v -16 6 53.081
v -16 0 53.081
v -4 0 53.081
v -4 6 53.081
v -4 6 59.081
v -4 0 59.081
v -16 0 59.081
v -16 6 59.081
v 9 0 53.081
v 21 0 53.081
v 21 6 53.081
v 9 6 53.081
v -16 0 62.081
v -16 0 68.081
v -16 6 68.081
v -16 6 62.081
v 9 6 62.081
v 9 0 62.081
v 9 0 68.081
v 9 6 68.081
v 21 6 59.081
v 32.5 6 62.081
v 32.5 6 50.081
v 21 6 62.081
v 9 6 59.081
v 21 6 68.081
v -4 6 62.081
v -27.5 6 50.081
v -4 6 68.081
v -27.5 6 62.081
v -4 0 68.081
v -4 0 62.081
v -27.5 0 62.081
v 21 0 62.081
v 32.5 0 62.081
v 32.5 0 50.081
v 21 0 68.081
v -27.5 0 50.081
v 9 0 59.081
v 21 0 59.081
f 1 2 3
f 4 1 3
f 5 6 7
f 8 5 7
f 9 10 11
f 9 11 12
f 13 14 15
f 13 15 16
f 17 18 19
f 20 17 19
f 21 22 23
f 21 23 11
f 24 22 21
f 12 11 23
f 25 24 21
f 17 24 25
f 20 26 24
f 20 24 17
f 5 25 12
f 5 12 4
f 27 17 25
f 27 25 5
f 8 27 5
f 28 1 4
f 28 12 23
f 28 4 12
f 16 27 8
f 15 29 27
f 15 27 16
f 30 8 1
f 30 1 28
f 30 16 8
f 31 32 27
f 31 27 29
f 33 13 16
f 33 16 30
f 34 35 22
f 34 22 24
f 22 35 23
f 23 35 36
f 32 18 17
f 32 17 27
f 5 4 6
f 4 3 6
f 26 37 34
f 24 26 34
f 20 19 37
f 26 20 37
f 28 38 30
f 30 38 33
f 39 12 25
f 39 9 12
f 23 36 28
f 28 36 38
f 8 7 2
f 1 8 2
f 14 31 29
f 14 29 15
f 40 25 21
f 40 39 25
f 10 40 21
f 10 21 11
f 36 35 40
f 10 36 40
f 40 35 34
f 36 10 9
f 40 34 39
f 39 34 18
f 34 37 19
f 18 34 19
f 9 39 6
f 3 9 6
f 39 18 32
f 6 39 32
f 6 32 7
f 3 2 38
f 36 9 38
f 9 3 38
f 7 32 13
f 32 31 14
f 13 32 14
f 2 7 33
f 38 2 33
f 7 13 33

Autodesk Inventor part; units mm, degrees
ref_plane "YZ Plane" through (0, 0, 0) normal (1, 0, 0) x (0, 1, 0)
ref_plane "XZ Plane" through (0, 0, 0) normal (0, 1, 0) x (-1, 0, 0)
ref_plane "XY Plane" through (0, 0, 0) normal (0, 0, 1) x (1, 0, 0)
sketch "Sketch1" plane through (0, 0, 0) normal (0, 1, 0) x (-1, 0, 0)
  line L0 (27.5, 50.0814) -> (27.5, 62.0814)
  line L1 (-32.5, 62.0814) -> (-32.5, 50.0814)
  line L2 (-32.5, 50.0814) -> (-2.5, 50.0814)
  line L3 (-2.5, 50.0814) -> (-2.5, 62.0814) construction
  line L4 (-32.5, 56.0814) -> (-2.5, 56.0814) construction
  line L5 (-32.5, 62.0814) -> (27.5, 62.0814)
  line L6 (-21, 62.0814) -> (-9, 62.0814)
  line L7 (-9, 62.0814) -> (-9, 68.0814)
  line L8 (-9, 68.0814) -> (-21, 68.0814)
  line L9 (-21, 68.0814) -> (-21, 62.0814)
  line L10 (16, 62.0814) -> (4, 62.0814)
  line L11 (4, 62.0814) -> (4, 68.0814)
  line L12 (4, 68.0814) -> (16, 68.0814)
  line L13 (16, 68.0814) -> (16, 62.0814)
  line L14 (-2.5, 56.0814) -> (27.5, 56.0814) construction
  line L15 (-2.5, 50.0814) -> (27.5, 50.0814)
  line L16 (-9, 59.0814) -> (-21, 59.0814)
  line L17 (-21, 59.0814) -> (-21, 53.0814)
  line L18 (-21, 53.0814) -> (-9, 53.0814)
  line L19 (-9, 53.0814) -> (-9, 59.0814)
  line L20 (-9, 59.0814) -> (-21, 53.0814) construction
  line L21 (-21, 59.0814) -> (-9, 53.0814) construction
  line L22 (4, 59.0814) -> (16, 59.0814)
  line L23 (16, 59.0814) -> (16, 53.0814)
  line L24 (16, 53.0814) -> (4, 53.0814)
  line L25 (4, 53.0814) -> (4, 59.0814)
  line L26 (4, 59.0814) -> (16, 53.0814) construction
  line L27 (16, 59.0814) -> (4, 53.0814) construction
  point P0 (-15, 56.0814)
  point P1 (10, 56.0814)
  dimension "d0" = 60
  dimension "d1" = 12
  dimension "d18" = 12
  dimension "d19" = 6
  dimension "d20" = 18.5
  dimension "d21" = 12
  dimension "d22" = 6
  dimension "d23" = 3
extrude "Extrusion1" add sketch "Sketch1" along normal blind 6
sketch "Sketch3" plane through (0, 0, 0) normal (0, 1, 0) x (-1, 0, 0)
  line L0 (4, 62.0814) -> (-9, 62.0814) construction
  line L1 (-2.5, 62.0814) -> (-2.5, 50.0814) construction
  line L2 (-32.5, 50.0814) -> (27.5, 50.0814) construction
  line L3 (8.5, 50.0814) -> (2.5, 50.0814)
  line L4 (2.5, 50.0814) -> (2.5, 44.0814)
  line L5 (2.5, 44.0814) -> (8.5, 44.0814)
  line L6 (8.5, 44.0814) -> (8.5, 50.0814)
  line L7 (8.5, -0.9186) -> (2.5, -0.9186)
  line L8 (2.5, -0.9186) -> (2.5, -6.9186)
  line L9 (2.5, -6.9186) -> (8.5, -6.9186)
  line L10 (8.5, -6.9186) -> (8.5, -0.9186)
  line L11 (8.5, 35.0814) -> (-9.5, 35.0814)
  line L12 (-9.5, 35.0814) -> (-9.5, 23.0814)
  line L13 (-9.5, 13.0814) -> (8.5, 13.0814)
  line L14 (8.5, 13.0814) -> (8.5, 23.0814)
  line L15 (-13, 35.0814) -> (12, 35.0814)
  line L16 (8.5, 23.0814) -> (-9.5, 23.0814)
  line L17 (1.5, 35.0814) -> (-5.5, 35.0814)
  line L18 (-5.5, 35.0814) -> (-5.5, 40.0814)
  line L19 (-5.5, 40.0814) -> (1.5, 40.0814)
  line L20 (1.5, 40.0814) -> (1.5, 35.0814)
  line L21 (-9.5, 23.0814) -> (-9.5, 13.0814)
  line L22 (8.5, 23.0814) -> (8.5, 35.0814)
  point P0 (0, 0)
  dimension "d37" = 6
  dimension "d38" = 6
  dimension "d39" = 6
  dimension "d43" = 12
  dimension "d44" = 45
  dimension "d45" = 5
  dimension "d46" = 18
  dimension "d47" = 22
  dimension "d53" = 9
  dimension "d58" = 7
  dimension "d59" = 5
  dimension "d60" = 1
extrude "Extrusion3" cut sketch "Sketch3" along normal through all
properties part number "thumper-bumper-sidewall2-v3"
